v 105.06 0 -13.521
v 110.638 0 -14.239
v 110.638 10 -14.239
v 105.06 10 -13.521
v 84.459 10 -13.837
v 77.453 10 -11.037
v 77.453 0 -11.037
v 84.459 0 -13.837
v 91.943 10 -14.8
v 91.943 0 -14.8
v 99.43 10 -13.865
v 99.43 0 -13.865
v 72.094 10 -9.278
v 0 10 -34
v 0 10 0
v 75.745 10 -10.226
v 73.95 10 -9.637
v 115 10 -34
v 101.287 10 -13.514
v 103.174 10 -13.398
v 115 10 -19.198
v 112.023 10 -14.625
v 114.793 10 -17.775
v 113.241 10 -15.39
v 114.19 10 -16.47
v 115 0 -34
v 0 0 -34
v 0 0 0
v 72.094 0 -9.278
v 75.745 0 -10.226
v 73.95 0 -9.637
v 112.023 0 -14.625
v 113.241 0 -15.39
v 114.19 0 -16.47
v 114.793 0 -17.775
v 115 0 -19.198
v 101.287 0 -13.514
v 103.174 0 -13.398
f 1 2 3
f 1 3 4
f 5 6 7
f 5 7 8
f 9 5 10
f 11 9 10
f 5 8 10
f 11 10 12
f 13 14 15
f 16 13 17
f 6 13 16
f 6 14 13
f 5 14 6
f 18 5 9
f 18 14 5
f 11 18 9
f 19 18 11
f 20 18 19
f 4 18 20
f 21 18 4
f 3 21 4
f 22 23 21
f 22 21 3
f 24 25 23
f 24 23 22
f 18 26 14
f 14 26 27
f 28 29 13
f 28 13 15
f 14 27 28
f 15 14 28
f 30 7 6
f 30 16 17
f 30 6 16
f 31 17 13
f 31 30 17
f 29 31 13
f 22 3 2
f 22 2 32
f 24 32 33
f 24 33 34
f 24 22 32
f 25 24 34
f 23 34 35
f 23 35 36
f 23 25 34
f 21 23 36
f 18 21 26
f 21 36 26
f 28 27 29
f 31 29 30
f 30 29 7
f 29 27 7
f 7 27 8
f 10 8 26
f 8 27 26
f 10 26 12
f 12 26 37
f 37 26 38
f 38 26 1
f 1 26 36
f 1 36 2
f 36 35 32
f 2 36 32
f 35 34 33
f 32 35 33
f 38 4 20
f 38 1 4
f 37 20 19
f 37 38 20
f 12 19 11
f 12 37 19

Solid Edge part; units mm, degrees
sketch "Sketch1" plane through (0, 0, 0) normal (0, -1, 0) x (1, 0, 0)
  line L0 (0, 0) -> (115, 0)
  line L1 (115, 0) -> (115, -34)
  line L2 (115, -34) -> (0, -34)
  line L3 (0, -34) -> (0, 0)
extrude "Protrusion1" add sketch "Sketch1" against normal blind 10
sketch "Sketch2" plane through (57.5, 0, -17) normal (0, -1, 0) x (1, 0, 0)
  line L0 (57.5, 2.2) -> (-57.5, 17)
  line L1 (-57.5, 17) -> (57.5, 17)
  line L2 (57.5, 17) -> (57.5, 2.2)
extrude "ExtrudedCutout_1" cut sketch "Sketch2" against normal blind 10
sketch "Sketch3" plane through (57.5, 0, -17) normal (0, -1, 0) x (1, 0, 0)
  circle A0 centre (34.5, 32.2) radius 30
extrude "ExtrudedCutout_2" cut sketch "Sketch3" against normal blind 10
fillet "Round_1" radius 15 2 edges at (75.2424, 5, -9.6834) (101.9112, 5, -13.1155)
fillet "Round_3" radius 5 1 edges at (115, 5, -14.8)
